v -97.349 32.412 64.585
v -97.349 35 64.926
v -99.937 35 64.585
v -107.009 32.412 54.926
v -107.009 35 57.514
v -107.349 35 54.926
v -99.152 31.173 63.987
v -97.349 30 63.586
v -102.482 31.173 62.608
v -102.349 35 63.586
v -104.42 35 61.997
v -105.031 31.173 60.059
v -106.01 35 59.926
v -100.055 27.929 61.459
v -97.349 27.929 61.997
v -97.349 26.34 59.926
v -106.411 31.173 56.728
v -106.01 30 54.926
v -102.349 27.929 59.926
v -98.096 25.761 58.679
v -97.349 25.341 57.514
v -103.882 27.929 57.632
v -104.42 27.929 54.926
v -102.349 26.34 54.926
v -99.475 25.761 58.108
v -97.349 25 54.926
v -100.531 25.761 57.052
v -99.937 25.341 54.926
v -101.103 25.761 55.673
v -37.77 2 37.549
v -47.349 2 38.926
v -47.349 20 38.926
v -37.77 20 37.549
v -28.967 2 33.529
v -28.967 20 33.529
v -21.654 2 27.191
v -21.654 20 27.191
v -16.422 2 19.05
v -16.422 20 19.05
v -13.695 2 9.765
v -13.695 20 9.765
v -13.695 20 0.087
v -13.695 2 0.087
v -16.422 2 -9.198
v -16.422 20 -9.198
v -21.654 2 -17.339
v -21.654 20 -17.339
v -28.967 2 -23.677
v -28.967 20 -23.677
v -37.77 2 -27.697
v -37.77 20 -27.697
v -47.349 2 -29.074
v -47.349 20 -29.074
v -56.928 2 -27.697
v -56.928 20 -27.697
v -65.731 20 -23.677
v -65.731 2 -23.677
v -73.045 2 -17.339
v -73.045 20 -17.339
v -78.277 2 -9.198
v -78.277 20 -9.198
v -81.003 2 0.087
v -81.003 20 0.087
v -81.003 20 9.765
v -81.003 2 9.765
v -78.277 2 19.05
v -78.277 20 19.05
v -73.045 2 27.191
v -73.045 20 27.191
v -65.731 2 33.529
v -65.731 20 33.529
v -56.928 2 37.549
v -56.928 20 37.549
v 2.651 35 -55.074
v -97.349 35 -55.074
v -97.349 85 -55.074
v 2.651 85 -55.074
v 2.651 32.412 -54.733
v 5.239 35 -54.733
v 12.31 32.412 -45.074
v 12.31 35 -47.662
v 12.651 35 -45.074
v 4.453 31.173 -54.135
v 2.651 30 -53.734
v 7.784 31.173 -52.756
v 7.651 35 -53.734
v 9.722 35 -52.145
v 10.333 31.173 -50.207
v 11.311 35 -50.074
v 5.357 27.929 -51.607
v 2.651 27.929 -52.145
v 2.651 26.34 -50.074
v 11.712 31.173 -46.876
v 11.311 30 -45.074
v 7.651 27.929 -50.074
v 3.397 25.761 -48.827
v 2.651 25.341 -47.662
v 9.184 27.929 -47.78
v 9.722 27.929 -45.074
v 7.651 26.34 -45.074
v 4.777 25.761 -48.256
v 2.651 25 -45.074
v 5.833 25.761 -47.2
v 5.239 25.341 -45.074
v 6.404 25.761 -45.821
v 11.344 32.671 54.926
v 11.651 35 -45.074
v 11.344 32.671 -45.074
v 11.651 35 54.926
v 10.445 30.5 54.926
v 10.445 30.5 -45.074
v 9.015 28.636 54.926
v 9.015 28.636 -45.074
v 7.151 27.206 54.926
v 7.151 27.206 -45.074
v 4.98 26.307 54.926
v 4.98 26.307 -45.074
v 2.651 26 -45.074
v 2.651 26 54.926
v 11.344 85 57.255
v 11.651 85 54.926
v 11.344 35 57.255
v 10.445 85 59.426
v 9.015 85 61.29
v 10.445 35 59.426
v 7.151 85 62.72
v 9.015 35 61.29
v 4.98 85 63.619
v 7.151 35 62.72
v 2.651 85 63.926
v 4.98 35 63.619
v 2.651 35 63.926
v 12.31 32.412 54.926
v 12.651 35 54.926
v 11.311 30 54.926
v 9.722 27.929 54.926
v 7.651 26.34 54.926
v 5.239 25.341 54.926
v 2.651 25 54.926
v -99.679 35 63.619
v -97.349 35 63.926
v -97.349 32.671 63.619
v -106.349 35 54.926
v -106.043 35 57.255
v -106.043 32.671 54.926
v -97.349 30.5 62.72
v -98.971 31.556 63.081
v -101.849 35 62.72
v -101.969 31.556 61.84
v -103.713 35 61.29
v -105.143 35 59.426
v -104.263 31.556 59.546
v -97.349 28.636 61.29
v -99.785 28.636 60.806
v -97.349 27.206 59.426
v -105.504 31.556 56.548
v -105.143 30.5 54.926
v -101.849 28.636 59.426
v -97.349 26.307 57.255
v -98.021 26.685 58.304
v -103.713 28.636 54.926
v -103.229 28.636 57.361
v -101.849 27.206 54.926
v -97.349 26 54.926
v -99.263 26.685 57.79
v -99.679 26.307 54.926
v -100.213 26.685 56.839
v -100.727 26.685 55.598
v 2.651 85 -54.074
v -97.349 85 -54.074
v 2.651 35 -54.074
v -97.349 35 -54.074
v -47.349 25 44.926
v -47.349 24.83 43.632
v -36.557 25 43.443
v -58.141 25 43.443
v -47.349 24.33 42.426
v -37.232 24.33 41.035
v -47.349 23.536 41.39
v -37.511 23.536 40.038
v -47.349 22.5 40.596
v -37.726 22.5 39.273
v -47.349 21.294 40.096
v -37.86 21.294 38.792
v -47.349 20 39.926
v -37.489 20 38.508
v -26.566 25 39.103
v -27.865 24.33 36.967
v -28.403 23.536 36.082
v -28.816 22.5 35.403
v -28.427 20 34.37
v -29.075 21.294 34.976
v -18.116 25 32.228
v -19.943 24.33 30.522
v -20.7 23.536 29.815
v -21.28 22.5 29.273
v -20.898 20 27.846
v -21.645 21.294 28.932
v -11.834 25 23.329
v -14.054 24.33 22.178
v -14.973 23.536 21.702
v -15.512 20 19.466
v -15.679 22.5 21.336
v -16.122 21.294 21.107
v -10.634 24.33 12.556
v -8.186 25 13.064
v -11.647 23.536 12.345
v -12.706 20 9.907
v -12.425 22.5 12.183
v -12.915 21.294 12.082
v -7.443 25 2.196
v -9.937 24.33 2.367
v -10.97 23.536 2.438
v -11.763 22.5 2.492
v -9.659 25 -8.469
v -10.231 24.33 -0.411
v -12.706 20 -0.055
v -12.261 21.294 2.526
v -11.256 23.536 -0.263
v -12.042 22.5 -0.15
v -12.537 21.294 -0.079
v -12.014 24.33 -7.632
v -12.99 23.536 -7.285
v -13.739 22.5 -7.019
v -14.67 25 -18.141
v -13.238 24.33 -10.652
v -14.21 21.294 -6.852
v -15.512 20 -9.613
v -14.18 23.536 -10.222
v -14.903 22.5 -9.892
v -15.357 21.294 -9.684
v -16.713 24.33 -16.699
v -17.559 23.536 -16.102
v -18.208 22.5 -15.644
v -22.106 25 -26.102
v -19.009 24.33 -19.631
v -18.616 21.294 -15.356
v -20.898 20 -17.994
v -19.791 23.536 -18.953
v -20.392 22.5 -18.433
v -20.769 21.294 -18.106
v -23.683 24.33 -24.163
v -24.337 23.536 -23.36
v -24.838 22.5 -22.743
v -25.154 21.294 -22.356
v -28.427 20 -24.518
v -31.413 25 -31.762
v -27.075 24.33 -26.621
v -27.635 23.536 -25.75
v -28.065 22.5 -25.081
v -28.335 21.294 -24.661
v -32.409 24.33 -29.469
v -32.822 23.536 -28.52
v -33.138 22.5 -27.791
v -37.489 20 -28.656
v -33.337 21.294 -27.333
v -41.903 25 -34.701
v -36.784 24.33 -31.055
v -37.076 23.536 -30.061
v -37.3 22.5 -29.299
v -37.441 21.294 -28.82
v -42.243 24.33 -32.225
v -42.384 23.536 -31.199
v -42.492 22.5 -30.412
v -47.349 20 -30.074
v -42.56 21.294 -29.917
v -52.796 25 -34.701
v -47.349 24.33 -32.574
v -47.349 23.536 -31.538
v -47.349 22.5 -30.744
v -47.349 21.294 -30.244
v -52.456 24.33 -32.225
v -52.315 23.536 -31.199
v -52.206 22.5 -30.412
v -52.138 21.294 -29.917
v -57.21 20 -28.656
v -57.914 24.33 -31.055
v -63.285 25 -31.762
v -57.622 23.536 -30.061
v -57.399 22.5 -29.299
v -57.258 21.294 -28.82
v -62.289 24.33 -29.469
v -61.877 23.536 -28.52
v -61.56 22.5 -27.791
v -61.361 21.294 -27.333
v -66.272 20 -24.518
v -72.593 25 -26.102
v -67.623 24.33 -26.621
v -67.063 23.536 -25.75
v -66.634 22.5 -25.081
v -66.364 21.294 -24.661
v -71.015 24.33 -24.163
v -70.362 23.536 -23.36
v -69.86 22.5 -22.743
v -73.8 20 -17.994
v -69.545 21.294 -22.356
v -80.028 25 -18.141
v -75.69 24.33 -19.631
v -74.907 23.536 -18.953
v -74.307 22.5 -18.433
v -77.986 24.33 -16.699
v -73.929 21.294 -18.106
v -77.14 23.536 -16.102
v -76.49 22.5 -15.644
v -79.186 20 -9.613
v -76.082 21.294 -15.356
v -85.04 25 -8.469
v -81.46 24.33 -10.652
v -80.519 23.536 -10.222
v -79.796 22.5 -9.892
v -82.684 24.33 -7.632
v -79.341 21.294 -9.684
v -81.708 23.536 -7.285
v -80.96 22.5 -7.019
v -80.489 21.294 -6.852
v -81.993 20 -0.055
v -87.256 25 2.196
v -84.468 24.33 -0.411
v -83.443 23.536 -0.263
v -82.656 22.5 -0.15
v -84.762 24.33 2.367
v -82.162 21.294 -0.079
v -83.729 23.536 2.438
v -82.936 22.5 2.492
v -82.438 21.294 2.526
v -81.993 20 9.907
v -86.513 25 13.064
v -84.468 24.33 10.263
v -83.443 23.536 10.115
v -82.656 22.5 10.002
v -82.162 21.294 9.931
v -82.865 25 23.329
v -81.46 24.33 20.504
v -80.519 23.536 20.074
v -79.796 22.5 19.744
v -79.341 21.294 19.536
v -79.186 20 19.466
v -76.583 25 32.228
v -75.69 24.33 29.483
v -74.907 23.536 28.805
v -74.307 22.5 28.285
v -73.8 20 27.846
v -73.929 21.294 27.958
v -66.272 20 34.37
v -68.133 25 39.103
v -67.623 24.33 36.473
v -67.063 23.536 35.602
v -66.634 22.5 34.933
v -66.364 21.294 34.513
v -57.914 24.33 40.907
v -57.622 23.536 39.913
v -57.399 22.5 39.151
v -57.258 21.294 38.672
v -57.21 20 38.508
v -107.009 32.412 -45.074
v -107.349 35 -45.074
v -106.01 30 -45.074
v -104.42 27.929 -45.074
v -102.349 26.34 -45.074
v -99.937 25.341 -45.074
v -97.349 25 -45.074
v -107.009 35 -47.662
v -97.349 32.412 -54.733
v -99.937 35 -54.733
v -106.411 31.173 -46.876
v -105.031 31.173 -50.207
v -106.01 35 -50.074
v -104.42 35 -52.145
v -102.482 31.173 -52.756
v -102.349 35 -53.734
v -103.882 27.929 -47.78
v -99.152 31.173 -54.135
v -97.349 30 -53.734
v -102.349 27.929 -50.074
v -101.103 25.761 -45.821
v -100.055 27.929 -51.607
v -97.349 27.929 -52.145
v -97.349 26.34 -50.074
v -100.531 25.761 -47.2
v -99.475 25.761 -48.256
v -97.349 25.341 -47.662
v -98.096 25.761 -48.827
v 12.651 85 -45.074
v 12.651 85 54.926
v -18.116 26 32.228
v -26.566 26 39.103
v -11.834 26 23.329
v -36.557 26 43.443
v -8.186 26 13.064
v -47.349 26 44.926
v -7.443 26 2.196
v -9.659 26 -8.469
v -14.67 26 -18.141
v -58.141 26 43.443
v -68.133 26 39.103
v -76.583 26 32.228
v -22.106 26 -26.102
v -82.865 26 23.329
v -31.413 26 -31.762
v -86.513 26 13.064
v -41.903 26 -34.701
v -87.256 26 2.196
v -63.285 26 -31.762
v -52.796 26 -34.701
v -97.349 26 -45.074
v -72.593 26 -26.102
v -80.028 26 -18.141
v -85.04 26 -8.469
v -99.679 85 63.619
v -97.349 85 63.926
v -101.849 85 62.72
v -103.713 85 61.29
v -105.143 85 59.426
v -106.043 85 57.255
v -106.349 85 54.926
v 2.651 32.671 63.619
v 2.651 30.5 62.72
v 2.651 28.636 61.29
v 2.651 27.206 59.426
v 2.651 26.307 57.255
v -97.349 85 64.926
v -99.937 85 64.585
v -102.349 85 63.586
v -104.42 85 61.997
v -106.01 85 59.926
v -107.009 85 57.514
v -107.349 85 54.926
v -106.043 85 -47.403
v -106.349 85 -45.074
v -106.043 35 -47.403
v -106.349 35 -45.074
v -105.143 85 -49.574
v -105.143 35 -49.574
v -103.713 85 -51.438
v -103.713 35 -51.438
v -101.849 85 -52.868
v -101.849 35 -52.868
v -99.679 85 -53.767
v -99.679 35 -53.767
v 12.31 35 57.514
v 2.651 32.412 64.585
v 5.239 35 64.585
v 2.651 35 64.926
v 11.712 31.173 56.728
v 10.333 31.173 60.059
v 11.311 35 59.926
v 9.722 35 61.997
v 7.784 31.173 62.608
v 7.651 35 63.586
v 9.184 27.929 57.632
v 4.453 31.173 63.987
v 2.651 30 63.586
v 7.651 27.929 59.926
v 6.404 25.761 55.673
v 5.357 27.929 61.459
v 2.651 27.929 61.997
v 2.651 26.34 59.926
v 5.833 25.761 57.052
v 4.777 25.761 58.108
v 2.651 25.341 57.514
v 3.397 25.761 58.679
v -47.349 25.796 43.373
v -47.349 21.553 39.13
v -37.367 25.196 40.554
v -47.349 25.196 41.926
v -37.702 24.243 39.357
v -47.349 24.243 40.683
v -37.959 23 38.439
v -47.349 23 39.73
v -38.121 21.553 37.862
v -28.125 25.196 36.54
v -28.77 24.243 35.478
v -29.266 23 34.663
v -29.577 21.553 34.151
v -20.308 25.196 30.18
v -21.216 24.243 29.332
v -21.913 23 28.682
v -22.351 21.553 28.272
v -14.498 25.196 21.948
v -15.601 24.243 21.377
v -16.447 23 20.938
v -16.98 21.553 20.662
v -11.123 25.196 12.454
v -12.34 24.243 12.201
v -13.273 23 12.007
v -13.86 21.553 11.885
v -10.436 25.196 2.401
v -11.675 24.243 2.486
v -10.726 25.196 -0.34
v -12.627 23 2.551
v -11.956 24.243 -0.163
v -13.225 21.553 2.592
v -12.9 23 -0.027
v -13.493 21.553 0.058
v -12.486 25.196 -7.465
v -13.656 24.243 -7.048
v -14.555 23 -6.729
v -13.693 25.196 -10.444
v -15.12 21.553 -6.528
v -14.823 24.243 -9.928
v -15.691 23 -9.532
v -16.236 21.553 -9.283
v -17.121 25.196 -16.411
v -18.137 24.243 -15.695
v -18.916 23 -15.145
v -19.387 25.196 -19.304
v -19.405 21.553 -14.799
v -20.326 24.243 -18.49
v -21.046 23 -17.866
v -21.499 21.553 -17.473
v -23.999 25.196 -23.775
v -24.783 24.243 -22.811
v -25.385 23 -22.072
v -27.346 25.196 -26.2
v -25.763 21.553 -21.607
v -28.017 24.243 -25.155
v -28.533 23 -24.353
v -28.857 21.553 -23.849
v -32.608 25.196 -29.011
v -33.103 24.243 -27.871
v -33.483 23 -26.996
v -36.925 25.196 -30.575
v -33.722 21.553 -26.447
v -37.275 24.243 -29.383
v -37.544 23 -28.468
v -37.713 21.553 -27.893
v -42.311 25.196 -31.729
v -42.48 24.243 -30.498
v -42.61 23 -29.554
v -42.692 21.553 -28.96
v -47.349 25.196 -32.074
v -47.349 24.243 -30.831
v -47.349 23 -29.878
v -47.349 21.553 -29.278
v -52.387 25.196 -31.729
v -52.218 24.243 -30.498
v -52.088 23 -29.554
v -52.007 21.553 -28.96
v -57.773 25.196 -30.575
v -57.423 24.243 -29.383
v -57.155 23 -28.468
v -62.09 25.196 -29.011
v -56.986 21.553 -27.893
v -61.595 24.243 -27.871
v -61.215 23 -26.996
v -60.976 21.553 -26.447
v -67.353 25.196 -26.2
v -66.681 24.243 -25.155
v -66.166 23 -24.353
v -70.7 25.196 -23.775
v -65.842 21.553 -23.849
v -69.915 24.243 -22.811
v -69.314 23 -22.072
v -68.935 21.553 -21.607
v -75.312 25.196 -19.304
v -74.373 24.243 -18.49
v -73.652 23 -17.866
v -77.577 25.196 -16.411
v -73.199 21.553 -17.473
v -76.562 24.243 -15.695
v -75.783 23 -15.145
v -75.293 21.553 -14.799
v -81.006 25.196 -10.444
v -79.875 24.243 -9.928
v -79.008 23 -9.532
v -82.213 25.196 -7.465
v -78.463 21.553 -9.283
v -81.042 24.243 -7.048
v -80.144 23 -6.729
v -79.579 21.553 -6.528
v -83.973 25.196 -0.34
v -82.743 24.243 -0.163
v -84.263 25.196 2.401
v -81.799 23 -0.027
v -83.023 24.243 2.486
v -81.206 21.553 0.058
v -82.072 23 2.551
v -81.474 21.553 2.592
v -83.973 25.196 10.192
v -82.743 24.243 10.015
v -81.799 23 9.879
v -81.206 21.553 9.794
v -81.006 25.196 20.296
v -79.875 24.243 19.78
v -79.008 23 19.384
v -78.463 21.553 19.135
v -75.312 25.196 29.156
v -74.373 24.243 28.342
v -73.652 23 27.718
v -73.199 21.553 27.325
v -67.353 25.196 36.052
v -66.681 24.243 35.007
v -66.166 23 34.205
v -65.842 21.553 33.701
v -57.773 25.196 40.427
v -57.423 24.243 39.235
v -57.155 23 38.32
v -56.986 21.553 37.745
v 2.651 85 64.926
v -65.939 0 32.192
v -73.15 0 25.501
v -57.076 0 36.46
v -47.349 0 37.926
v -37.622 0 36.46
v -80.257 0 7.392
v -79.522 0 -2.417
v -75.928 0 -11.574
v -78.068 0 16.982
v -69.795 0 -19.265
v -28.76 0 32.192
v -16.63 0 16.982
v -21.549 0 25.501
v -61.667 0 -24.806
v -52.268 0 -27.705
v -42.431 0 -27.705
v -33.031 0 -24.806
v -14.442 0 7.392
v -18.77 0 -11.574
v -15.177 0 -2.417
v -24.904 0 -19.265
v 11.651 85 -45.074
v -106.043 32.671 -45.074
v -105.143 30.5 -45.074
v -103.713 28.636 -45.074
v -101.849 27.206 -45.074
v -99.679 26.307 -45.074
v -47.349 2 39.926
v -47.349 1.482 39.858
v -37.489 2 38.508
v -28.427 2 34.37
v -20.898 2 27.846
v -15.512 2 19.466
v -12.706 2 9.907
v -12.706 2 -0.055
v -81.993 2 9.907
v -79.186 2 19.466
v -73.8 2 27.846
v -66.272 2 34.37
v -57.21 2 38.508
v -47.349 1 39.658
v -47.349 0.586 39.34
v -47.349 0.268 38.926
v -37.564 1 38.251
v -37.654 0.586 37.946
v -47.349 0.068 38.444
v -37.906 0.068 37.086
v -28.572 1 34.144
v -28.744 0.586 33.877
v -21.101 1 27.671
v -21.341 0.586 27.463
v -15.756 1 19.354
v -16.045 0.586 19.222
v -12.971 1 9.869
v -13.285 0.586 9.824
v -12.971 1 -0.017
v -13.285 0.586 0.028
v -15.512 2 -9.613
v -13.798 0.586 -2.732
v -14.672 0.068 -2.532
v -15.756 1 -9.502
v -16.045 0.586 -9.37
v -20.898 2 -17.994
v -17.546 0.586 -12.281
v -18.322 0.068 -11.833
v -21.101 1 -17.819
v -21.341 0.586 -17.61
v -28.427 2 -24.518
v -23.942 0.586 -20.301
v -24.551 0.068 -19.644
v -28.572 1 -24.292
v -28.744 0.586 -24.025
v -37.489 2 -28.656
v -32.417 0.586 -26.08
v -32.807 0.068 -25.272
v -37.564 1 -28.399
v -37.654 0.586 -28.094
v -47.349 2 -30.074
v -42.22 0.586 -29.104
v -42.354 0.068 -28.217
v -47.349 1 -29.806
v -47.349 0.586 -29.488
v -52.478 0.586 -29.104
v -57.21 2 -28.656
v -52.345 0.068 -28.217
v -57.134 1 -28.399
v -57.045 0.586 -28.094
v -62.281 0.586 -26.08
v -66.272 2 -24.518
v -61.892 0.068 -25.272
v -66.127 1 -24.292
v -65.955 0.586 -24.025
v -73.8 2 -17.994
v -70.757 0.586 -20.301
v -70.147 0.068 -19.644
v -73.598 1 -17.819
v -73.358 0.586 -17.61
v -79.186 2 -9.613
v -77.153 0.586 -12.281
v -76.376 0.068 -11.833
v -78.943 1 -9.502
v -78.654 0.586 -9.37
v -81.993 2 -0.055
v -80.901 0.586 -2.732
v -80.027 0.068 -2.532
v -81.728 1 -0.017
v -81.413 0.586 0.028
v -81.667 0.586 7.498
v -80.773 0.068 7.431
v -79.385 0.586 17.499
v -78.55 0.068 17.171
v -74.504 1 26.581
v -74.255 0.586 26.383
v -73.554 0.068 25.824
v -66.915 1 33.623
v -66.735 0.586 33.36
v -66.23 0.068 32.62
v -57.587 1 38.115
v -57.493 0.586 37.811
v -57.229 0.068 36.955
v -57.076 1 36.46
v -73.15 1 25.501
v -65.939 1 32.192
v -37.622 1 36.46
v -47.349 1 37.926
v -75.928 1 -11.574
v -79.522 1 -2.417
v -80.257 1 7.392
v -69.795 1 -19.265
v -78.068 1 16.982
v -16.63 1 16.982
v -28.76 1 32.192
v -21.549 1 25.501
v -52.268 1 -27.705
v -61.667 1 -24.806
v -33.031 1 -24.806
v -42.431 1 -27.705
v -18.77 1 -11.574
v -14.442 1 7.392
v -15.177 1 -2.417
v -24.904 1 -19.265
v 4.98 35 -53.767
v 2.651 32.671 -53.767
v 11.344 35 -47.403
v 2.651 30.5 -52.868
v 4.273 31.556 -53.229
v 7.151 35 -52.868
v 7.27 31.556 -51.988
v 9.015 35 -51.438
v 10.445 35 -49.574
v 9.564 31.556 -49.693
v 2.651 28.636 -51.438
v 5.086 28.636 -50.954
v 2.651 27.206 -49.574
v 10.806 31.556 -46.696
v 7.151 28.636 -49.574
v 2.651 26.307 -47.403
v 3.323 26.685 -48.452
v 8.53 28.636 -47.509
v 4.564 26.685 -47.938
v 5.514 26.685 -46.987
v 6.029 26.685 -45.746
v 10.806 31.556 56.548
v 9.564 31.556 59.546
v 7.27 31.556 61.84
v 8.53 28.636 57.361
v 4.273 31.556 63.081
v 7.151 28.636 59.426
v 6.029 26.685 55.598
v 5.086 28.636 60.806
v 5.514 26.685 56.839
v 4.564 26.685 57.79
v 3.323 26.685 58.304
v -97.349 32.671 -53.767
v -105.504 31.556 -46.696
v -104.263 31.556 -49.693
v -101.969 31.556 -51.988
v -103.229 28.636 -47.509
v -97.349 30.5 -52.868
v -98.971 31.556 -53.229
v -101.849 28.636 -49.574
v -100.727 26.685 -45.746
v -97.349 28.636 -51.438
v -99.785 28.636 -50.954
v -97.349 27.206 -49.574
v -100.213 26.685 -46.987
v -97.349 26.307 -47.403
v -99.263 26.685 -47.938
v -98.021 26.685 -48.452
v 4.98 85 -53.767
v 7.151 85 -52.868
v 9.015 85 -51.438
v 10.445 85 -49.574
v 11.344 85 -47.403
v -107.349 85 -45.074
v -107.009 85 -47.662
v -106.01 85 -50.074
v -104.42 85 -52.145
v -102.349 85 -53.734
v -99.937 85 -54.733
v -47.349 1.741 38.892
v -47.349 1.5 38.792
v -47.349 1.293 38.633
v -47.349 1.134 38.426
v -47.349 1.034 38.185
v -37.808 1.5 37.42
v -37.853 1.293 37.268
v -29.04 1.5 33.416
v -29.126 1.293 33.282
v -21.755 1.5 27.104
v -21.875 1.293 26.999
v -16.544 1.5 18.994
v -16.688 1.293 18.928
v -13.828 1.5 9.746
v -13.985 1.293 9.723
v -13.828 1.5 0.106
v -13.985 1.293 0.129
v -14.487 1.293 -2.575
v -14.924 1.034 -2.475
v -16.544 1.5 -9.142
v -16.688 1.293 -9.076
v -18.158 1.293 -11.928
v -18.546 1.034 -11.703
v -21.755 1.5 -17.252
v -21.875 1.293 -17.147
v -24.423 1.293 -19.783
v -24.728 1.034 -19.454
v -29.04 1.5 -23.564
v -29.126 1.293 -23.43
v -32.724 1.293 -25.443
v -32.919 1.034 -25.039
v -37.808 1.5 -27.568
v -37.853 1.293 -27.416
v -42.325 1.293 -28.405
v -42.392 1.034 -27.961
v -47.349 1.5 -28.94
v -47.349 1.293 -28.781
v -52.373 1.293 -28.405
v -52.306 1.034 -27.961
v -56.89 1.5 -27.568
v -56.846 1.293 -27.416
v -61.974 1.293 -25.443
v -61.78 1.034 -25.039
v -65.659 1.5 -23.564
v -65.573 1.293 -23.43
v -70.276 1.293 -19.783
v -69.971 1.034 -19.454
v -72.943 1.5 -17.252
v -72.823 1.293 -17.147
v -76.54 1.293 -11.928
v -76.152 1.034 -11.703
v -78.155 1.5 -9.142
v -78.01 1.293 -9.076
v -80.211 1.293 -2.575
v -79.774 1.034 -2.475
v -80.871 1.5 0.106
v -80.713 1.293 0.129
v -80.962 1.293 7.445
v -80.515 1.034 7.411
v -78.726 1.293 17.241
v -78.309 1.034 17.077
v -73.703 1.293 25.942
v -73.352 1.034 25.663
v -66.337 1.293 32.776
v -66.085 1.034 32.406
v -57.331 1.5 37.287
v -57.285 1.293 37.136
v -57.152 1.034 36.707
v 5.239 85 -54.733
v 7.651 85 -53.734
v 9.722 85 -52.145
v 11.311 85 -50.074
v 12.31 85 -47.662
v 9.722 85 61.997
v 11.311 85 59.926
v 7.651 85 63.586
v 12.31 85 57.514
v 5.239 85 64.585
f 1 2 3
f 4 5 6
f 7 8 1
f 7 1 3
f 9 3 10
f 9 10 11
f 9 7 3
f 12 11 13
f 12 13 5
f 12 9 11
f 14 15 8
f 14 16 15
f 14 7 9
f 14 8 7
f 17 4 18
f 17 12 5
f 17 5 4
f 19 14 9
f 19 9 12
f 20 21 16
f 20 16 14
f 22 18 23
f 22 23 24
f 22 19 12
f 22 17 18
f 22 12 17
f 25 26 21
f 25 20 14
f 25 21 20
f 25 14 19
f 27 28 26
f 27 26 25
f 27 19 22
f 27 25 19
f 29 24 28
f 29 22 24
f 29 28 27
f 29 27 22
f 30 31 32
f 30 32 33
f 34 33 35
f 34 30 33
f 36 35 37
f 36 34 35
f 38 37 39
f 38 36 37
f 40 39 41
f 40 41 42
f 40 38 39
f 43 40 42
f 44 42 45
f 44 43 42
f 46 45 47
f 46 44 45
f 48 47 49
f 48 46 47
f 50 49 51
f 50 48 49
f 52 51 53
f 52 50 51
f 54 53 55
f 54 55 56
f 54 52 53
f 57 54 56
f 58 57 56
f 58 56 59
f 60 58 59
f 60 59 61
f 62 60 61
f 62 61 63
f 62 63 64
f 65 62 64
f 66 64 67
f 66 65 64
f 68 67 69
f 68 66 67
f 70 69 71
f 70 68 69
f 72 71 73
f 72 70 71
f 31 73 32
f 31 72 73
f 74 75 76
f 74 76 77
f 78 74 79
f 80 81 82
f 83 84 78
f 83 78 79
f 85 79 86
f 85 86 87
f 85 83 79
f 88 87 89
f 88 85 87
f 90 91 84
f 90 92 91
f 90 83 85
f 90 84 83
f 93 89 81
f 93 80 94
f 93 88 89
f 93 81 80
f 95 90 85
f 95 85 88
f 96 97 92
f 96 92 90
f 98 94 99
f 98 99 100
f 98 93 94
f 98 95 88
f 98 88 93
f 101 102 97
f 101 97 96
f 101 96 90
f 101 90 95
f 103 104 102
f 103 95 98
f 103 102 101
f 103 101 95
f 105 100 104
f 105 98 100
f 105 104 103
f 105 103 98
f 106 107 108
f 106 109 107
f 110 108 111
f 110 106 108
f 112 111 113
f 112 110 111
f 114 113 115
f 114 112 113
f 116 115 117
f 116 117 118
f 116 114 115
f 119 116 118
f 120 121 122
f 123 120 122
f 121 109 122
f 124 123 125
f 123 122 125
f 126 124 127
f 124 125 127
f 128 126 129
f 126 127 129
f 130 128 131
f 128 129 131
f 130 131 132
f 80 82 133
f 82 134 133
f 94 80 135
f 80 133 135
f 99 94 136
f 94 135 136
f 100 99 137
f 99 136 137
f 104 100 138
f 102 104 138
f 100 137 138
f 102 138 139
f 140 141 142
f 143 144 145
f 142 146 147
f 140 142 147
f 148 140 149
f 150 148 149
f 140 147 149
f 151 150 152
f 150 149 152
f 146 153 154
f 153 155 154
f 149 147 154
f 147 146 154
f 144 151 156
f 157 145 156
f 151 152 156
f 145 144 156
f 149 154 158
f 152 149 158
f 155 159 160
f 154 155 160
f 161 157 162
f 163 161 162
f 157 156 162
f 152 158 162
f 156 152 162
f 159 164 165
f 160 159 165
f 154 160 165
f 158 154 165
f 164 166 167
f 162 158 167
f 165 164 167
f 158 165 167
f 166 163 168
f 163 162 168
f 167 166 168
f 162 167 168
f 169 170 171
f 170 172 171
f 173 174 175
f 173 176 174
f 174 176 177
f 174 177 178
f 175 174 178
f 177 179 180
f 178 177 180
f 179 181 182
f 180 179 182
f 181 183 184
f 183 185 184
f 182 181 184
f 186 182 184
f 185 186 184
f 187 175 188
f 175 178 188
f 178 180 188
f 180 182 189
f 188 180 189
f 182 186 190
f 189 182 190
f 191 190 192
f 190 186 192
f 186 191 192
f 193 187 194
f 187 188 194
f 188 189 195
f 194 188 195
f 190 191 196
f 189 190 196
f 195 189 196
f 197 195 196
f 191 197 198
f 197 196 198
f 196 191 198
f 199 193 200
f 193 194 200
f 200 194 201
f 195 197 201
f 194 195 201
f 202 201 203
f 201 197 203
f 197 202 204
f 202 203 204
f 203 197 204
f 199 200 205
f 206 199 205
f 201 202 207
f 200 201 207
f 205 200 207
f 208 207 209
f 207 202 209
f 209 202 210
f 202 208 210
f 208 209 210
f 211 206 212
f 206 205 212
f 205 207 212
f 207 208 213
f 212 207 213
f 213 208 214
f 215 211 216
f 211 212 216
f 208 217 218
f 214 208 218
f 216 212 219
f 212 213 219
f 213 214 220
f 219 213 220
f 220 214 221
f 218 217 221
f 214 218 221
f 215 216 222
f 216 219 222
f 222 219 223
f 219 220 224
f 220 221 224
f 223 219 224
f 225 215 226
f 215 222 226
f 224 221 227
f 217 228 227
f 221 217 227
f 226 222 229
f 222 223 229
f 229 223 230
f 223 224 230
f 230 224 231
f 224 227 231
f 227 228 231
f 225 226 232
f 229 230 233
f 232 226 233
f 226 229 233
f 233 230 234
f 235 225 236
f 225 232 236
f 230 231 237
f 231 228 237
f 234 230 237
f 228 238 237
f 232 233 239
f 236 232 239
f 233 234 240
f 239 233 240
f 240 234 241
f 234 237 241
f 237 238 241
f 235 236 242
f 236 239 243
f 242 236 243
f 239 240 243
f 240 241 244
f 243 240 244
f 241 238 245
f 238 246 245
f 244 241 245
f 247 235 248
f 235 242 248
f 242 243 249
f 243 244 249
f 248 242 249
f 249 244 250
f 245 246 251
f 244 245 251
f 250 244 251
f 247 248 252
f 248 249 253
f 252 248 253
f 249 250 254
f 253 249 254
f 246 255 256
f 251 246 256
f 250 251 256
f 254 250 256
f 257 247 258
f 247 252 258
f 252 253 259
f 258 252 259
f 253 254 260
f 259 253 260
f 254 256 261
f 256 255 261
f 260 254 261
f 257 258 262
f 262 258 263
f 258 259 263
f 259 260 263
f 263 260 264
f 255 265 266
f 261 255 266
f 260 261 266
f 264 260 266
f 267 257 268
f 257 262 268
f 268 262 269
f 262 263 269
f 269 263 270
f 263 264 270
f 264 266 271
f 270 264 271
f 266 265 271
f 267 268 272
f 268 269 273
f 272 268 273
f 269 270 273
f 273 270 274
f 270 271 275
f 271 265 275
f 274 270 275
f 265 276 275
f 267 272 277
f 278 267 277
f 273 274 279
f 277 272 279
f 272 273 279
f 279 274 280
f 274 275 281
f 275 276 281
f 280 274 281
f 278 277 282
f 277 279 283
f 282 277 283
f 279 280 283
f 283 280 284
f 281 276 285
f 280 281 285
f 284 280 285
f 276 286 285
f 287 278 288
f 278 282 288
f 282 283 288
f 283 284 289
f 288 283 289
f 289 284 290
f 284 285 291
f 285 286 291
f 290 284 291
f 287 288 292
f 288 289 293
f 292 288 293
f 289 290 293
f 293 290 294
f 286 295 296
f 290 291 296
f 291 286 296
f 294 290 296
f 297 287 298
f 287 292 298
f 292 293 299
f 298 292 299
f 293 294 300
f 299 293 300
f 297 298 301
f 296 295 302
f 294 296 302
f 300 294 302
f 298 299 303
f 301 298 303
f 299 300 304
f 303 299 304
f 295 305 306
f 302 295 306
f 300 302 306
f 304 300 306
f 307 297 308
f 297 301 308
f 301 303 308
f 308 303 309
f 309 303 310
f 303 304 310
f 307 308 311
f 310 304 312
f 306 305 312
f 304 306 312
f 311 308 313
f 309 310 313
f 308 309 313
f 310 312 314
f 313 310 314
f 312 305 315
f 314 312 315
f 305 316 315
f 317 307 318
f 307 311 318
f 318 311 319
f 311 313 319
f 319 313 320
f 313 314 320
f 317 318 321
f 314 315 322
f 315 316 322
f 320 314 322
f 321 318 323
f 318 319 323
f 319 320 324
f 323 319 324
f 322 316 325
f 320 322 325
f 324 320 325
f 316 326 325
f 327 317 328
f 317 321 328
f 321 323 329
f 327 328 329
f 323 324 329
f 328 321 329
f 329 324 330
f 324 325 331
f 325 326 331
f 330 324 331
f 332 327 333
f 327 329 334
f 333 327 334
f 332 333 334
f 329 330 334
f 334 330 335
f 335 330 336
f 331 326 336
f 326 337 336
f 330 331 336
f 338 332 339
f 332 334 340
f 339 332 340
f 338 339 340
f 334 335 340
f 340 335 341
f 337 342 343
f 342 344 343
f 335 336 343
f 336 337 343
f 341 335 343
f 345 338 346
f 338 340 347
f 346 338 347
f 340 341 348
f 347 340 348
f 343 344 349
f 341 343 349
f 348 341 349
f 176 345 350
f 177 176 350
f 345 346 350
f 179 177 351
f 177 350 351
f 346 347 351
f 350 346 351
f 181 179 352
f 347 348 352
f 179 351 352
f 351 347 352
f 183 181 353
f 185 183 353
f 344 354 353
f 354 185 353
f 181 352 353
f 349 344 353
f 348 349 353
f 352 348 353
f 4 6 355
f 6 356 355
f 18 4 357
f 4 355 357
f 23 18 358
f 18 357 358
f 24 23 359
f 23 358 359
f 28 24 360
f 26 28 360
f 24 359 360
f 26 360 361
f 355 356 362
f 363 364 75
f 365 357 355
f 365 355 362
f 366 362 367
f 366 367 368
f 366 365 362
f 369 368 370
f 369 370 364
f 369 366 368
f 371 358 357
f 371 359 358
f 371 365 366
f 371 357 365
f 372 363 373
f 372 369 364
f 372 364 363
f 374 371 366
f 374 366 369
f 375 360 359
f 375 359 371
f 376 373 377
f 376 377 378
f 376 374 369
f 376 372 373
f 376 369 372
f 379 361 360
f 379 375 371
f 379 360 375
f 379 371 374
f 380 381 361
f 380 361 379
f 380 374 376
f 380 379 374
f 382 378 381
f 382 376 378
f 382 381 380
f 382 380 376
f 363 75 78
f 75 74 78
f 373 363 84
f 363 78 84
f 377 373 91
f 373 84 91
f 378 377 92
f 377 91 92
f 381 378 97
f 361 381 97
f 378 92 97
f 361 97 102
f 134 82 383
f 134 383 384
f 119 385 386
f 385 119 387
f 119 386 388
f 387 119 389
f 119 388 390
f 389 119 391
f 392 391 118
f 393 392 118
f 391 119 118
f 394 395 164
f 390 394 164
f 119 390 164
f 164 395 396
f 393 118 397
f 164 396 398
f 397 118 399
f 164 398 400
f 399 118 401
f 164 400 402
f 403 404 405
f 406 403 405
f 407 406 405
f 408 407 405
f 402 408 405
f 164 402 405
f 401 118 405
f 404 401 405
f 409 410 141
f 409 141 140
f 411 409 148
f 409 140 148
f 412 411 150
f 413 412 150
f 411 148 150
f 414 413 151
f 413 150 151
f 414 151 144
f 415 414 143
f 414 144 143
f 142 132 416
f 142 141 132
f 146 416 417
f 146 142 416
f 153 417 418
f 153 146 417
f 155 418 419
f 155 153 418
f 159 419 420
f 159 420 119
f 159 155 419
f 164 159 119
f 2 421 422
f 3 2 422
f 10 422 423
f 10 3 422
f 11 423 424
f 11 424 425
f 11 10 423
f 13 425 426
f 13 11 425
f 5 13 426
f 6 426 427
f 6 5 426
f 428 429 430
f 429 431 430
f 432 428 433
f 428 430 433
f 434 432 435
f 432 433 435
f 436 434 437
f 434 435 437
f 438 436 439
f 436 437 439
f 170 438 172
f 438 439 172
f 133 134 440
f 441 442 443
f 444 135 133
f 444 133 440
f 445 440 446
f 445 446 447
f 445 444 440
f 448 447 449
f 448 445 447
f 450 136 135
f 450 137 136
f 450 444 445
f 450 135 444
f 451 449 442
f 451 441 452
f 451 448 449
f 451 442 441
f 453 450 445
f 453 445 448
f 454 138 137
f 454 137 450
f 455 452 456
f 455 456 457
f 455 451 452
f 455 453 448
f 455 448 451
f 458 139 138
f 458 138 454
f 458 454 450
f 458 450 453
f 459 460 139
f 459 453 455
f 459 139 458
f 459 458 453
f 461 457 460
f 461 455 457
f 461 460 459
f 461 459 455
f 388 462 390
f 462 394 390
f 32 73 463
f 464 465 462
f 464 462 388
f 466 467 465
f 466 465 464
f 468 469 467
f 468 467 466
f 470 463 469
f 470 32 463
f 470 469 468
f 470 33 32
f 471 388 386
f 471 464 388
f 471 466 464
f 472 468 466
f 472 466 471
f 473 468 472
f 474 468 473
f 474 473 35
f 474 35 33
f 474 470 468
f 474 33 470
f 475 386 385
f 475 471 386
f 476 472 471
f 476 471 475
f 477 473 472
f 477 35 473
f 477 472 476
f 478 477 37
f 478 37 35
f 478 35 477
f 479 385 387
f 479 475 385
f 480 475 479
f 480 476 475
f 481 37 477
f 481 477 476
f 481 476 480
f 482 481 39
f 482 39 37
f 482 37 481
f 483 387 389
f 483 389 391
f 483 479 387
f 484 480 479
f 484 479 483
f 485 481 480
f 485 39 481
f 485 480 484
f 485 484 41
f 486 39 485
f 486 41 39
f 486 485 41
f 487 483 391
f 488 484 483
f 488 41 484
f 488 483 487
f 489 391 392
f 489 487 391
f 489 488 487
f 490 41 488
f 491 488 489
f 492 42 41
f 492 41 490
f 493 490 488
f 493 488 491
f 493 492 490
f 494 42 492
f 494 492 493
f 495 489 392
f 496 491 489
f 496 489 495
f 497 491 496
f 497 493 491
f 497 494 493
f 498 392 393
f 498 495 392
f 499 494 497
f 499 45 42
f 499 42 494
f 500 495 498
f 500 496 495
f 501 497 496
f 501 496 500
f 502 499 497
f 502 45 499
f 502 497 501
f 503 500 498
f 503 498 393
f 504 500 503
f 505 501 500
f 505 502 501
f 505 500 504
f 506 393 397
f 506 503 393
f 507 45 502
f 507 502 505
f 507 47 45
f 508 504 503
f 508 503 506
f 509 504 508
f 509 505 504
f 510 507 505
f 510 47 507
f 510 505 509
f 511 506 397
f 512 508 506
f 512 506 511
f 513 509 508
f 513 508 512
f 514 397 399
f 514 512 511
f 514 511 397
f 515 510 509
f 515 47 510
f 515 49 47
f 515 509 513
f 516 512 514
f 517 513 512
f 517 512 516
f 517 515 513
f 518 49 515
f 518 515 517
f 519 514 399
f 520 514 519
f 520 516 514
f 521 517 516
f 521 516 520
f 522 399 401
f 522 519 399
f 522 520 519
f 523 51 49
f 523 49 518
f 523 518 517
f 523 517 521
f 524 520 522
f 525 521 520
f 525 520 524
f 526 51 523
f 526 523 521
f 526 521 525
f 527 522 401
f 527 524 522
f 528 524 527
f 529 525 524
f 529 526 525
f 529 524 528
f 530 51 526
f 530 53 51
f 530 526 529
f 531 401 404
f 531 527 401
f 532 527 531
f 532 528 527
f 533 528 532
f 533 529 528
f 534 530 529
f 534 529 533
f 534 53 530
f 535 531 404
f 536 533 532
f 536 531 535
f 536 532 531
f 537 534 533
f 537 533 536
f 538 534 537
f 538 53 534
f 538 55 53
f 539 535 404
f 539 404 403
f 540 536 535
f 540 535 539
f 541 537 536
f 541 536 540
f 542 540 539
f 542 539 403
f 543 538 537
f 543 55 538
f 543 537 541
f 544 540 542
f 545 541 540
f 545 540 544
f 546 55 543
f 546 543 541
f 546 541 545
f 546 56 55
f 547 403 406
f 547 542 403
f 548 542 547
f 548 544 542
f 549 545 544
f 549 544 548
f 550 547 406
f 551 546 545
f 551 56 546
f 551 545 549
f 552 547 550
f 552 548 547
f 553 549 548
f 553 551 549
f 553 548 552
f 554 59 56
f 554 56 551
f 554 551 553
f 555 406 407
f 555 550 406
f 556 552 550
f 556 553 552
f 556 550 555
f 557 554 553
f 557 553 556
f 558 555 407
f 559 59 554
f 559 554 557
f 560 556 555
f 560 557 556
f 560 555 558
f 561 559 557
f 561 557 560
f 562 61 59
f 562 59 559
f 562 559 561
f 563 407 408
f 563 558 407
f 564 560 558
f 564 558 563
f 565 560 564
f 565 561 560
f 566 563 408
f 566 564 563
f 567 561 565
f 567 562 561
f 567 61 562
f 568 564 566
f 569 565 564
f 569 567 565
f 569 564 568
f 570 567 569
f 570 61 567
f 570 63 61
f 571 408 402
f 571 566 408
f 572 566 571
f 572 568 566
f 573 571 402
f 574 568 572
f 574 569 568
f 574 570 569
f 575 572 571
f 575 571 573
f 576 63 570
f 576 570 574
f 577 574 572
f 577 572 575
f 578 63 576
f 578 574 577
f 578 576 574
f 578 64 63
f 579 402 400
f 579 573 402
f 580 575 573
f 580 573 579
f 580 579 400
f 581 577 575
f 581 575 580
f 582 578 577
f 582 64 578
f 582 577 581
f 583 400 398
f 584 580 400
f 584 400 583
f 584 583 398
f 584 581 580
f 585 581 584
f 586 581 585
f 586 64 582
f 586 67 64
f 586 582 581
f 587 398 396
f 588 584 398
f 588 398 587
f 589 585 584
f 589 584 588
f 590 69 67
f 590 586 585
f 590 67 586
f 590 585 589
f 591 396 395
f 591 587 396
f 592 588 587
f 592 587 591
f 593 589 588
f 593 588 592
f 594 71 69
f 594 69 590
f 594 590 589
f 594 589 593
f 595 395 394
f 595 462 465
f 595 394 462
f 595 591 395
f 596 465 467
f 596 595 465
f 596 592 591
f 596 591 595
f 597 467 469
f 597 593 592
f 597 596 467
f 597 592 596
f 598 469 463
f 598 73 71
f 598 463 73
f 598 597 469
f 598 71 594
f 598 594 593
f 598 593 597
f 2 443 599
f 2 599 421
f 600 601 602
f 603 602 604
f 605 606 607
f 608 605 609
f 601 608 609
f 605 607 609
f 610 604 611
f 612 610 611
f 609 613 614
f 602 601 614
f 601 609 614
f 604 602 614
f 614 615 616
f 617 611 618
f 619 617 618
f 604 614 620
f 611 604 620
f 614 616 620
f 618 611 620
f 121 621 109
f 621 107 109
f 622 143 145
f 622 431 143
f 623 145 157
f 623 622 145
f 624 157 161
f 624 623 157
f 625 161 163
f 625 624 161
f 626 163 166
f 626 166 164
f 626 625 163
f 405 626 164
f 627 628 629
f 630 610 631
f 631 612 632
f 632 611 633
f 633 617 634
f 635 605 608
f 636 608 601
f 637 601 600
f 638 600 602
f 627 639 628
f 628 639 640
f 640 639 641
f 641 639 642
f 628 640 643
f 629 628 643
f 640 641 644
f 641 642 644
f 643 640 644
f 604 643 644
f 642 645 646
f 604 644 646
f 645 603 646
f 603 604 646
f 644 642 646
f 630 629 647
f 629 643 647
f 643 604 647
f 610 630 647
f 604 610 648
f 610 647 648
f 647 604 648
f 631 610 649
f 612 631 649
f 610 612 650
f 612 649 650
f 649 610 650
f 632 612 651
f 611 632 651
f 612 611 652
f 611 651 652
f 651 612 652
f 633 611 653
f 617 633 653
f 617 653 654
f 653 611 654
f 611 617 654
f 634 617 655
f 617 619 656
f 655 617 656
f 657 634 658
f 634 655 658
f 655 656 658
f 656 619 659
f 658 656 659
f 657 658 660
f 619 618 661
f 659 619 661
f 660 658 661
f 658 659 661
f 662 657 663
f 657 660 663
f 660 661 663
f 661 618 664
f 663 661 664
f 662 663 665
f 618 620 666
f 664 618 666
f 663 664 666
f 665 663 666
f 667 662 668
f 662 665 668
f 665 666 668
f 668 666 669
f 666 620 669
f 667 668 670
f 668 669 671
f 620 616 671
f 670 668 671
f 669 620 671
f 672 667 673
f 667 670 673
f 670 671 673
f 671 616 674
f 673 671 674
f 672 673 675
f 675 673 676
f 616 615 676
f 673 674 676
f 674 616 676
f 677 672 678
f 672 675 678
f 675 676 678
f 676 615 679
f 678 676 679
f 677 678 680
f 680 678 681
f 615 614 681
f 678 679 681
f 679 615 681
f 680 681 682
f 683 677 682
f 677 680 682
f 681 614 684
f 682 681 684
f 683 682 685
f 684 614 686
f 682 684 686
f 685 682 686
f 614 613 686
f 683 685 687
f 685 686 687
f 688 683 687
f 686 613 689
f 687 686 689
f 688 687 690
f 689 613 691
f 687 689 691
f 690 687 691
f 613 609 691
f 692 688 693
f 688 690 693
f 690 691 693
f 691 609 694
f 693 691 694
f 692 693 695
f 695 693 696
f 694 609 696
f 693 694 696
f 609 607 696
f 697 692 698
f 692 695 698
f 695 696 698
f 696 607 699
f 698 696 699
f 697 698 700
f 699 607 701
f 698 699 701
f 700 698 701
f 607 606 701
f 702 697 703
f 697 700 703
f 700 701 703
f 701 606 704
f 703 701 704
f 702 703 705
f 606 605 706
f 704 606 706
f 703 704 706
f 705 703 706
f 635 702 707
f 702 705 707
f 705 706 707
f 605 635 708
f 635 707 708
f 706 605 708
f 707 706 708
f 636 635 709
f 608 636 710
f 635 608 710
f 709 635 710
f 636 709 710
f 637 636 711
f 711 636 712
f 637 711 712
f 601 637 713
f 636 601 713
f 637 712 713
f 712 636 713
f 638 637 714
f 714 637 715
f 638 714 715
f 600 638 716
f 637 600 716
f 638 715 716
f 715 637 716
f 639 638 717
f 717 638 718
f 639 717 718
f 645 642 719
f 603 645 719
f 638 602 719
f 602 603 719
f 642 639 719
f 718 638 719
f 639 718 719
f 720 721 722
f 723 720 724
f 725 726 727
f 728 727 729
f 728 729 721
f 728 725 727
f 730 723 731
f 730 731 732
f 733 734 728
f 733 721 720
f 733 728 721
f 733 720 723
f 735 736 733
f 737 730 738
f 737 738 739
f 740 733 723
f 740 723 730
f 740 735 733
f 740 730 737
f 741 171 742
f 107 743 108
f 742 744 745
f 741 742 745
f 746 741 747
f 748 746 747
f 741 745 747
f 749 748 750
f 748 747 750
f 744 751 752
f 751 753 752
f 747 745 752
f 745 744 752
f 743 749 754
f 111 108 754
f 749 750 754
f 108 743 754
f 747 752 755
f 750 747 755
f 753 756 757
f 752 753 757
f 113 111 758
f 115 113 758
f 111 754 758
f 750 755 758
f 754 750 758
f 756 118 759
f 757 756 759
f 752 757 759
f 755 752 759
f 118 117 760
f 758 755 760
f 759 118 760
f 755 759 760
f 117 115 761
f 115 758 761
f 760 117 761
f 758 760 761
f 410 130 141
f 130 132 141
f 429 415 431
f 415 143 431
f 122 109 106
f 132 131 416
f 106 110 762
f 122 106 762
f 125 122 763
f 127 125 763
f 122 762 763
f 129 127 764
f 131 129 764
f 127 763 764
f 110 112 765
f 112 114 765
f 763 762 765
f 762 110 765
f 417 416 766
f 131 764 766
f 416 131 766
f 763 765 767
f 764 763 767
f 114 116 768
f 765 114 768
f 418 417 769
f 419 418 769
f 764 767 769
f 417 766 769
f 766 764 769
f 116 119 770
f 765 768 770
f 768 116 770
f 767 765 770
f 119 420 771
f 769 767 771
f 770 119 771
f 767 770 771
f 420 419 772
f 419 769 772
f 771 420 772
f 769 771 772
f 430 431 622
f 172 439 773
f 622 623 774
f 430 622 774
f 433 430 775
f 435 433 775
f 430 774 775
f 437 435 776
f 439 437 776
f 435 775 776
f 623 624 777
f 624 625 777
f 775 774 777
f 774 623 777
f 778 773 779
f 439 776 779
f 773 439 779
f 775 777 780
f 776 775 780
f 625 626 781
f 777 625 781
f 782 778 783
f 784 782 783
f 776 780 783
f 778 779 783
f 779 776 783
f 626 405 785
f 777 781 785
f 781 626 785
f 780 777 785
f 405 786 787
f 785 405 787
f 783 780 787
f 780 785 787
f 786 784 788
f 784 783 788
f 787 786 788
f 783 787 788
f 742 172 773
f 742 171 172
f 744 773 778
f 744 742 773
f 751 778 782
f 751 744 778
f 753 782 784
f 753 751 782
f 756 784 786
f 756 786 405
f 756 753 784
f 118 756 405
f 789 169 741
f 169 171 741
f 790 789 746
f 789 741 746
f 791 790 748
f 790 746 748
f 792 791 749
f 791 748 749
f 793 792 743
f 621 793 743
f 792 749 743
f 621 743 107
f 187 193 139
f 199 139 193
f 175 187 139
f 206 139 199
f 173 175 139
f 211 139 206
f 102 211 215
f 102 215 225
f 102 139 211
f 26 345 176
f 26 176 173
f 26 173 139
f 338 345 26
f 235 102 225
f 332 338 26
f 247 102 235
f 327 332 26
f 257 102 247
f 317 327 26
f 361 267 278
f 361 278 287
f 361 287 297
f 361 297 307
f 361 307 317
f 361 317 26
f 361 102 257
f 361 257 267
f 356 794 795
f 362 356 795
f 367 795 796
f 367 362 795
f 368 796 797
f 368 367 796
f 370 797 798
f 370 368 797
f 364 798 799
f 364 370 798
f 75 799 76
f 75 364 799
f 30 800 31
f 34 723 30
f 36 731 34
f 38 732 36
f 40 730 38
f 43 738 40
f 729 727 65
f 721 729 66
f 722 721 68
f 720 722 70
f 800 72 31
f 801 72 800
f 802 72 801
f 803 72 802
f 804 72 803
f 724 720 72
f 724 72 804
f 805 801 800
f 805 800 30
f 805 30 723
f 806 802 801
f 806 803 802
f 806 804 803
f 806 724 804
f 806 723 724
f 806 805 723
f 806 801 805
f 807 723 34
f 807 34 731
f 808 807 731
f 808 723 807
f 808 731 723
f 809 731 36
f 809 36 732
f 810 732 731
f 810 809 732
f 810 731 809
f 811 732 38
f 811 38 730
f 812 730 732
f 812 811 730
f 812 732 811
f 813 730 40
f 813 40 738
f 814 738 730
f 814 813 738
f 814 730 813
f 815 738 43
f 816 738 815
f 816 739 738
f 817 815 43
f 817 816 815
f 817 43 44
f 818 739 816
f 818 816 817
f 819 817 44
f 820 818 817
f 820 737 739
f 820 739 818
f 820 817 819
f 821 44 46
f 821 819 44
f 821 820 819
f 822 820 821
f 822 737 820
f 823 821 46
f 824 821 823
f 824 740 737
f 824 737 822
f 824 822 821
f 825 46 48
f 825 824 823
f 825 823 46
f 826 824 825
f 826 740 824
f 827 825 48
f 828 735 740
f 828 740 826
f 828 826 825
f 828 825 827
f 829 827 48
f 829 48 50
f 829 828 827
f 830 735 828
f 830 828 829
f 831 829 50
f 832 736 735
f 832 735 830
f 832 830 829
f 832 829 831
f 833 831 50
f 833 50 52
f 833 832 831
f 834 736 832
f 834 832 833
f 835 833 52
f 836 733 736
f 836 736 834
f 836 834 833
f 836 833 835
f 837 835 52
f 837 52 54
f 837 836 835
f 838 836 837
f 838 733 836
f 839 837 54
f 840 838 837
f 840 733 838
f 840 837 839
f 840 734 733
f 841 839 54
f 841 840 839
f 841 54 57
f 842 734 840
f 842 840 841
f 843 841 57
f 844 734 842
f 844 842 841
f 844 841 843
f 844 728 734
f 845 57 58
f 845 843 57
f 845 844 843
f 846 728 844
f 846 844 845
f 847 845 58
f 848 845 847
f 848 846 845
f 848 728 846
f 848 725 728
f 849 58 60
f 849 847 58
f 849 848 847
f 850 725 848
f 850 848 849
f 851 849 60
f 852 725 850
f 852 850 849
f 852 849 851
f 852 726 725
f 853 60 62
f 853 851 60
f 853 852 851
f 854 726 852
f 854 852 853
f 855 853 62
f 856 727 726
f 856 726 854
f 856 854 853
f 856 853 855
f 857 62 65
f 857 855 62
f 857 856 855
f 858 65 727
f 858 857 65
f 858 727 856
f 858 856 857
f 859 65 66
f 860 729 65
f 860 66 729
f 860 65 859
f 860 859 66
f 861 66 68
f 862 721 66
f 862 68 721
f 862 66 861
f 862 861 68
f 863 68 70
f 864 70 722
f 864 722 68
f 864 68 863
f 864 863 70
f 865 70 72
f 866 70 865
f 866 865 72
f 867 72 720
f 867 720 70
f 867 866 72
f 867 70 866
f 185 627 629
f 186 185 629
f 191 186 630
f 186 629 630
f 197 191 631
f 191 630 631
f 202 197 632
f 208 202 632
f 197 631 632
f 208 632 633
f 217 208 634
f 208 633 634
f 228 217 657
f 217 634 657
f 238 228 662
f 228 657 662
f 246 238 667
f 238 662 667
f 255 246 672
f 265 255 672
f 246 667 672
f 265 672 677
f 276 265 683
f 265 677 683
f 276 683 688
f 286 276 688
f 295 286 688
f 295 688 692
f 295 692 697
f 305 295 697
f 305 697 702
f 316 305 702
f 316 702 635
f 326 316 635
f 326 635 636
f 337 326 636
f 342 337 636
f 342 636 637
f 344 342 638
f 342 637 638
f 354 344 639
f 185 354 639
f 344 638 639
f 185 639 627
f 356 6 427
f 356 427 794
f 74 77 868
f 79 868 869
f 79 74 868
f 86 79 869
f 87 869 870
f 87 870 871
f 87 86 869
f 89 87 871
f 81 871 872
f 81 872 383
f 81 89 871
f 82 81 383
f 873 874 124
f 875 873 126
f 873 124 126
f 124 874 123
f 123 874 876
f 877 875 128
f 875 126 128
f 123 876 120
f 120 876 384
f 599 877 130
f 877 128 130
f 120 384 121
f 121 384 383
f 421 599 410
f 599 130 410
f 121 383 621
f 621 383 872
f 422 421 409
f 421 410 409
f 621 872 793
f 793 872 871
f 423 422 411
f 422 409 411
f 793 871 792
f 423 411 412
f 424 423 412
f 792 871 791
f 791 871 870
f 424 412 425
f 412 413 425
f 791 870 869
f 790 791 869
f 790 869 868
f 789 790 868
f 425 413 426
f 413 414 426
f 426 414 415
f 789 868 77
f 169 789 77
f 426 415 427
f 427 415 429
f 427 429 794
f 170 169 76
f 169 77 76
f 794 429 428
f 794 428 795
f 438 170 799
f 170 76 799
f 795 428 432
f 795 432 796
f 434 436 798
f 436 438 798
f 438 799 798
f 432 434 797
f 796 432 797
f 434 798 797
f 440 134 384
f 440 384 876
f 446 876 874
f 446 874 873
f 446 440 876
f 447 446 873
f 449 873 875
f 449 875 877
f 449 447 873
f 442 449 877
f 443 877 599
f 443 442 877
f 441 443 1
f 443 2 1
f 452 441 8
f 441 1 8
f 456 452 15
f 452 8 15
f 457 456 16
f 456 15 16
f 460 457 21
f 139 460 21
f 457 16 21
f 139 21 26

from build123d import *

# Parameters (mm, degrees)
SKETCH1_R           = 35
SKETCH1_R_2         = 25
BOSS_EXTRUDE1_DEPTH = 25
BOSS_EXTRUDE2_DEPTH = 60
FILLET2_R           = 10
FILLET3_R           = 5
FILLET4_R           = 2
SHELL1_T            = -1


with BuildPart() as part:
    # Sketch1 → Boss-Extrude1 (new body)
    # profile 1 of 2: a face of its own
    with BuildSketch(Plane(origin=(0, 0, 0), x_dir=(1, 0, 0), z_dir=(0, 1, 0))):
        with Locations(Location((-47.349258728, -4.926027286, 0), (0, 0, 270))):
            Circle(SKETCH1_R)
        with Locations((-47.349258728, -4.926027286)):
            Circle(SKETCH1_R_2, mode=Mode.SUBTRACT)
    # profile 2 of 2: a face of its own
    with BuildSketch(Plane(origin=(0, 0, 0), x_dir=(1, 0, 0), z_dir=(0, 1, 0))):
        with Locations((-47.349258728, -4.926027286)):
            Circle(SKETCH1_R_2)
    extrude(amount=BOSS_EXTRUDE1_DEPTH)

    # Sketch2 → Boss-Extrude2 (add)
    with BuildSketch(Plane(origin=(0, 25, 0), x_dir=(1, 0, 0), z_dir=(0, 1, 0))):
        with BuildLine():
            Line((-97.349258728, 55.073972714), (2.650741272, 55.073972714))
            ThreePointArc((2.650741272, 55.073972714), (9.721809084, 52.145040526), (12.650741272, 45.073972714))
            Line((12.650741272, 45.073972714), (12.650741272, -54.926027286))
            ThreePointArc((12.650741272, -54.926027286), (9.721809084, -61.997095098), (2.650741272, -64.926027286))
            Line((2.650741272, -64.926027286), (-97.349258728, -64.926027286))
            ThreePointArc((-97.349258728, -64.926027286), (-104.42032654, -61.997095098), (-107.349258728, -54.926027286))
            Line((-107.349258728, -54.926027286), (-107.349258728, 45.073972714))
            ThreePointArc((-107.349258728, 45.073972714), (-104.42032654, 52.145040526), (-97.349258728, 55.073972714))
        make_face()
    extrude(amount=BOSS_EXTRUDE2_DEPTH)

    # Fillet2
    fillet2_edges = [part.edges().sort_by_distance(p)[0] for p in [
        (-104.42032654, 25, -52.145040526),
        (-107.349258728, 25, 4.926027286),
        (-104.42032654, 25, 61.997095098),
        (-47.349258728, 25, 64.926027286),
        (9.721809084, 25, 61.997095098),
        (12.650741272, 25, 4.926027286),
        (9.721809084, 25, -52.145040526),
        (-47.349258728, 25, -55.073972714),
    ]]
    fillet(fillet2_edges, radius=FILLET2_R)

    # Fillet3
    fillet3_edges = [part.edges().sort_by_distance(p)[0] for p in [
        (-47.349258728, 25, -30.073972714),
    ]]
    fillet(fillet3_edges, radius=FILLET3_R)

    # Fillet4
    fillet4_edges = [part.edges().sort_by_distance(p)[0] for p in [
        (-47.349258728, 0, -30.073972714),
    ]]
    fillet(fillet4_edges, radius=FILLET4_R)

    # Shell1
    shell1_openings = [part.faces().sort_by_distance(p)[0] for p in [
        (-47.349258728, 85, 4.926027286),
    ]]
    offset(amount=SHELL1_T, openings=shell1_openings, kind=Kind.INTERSECTION)


solid = part.part
